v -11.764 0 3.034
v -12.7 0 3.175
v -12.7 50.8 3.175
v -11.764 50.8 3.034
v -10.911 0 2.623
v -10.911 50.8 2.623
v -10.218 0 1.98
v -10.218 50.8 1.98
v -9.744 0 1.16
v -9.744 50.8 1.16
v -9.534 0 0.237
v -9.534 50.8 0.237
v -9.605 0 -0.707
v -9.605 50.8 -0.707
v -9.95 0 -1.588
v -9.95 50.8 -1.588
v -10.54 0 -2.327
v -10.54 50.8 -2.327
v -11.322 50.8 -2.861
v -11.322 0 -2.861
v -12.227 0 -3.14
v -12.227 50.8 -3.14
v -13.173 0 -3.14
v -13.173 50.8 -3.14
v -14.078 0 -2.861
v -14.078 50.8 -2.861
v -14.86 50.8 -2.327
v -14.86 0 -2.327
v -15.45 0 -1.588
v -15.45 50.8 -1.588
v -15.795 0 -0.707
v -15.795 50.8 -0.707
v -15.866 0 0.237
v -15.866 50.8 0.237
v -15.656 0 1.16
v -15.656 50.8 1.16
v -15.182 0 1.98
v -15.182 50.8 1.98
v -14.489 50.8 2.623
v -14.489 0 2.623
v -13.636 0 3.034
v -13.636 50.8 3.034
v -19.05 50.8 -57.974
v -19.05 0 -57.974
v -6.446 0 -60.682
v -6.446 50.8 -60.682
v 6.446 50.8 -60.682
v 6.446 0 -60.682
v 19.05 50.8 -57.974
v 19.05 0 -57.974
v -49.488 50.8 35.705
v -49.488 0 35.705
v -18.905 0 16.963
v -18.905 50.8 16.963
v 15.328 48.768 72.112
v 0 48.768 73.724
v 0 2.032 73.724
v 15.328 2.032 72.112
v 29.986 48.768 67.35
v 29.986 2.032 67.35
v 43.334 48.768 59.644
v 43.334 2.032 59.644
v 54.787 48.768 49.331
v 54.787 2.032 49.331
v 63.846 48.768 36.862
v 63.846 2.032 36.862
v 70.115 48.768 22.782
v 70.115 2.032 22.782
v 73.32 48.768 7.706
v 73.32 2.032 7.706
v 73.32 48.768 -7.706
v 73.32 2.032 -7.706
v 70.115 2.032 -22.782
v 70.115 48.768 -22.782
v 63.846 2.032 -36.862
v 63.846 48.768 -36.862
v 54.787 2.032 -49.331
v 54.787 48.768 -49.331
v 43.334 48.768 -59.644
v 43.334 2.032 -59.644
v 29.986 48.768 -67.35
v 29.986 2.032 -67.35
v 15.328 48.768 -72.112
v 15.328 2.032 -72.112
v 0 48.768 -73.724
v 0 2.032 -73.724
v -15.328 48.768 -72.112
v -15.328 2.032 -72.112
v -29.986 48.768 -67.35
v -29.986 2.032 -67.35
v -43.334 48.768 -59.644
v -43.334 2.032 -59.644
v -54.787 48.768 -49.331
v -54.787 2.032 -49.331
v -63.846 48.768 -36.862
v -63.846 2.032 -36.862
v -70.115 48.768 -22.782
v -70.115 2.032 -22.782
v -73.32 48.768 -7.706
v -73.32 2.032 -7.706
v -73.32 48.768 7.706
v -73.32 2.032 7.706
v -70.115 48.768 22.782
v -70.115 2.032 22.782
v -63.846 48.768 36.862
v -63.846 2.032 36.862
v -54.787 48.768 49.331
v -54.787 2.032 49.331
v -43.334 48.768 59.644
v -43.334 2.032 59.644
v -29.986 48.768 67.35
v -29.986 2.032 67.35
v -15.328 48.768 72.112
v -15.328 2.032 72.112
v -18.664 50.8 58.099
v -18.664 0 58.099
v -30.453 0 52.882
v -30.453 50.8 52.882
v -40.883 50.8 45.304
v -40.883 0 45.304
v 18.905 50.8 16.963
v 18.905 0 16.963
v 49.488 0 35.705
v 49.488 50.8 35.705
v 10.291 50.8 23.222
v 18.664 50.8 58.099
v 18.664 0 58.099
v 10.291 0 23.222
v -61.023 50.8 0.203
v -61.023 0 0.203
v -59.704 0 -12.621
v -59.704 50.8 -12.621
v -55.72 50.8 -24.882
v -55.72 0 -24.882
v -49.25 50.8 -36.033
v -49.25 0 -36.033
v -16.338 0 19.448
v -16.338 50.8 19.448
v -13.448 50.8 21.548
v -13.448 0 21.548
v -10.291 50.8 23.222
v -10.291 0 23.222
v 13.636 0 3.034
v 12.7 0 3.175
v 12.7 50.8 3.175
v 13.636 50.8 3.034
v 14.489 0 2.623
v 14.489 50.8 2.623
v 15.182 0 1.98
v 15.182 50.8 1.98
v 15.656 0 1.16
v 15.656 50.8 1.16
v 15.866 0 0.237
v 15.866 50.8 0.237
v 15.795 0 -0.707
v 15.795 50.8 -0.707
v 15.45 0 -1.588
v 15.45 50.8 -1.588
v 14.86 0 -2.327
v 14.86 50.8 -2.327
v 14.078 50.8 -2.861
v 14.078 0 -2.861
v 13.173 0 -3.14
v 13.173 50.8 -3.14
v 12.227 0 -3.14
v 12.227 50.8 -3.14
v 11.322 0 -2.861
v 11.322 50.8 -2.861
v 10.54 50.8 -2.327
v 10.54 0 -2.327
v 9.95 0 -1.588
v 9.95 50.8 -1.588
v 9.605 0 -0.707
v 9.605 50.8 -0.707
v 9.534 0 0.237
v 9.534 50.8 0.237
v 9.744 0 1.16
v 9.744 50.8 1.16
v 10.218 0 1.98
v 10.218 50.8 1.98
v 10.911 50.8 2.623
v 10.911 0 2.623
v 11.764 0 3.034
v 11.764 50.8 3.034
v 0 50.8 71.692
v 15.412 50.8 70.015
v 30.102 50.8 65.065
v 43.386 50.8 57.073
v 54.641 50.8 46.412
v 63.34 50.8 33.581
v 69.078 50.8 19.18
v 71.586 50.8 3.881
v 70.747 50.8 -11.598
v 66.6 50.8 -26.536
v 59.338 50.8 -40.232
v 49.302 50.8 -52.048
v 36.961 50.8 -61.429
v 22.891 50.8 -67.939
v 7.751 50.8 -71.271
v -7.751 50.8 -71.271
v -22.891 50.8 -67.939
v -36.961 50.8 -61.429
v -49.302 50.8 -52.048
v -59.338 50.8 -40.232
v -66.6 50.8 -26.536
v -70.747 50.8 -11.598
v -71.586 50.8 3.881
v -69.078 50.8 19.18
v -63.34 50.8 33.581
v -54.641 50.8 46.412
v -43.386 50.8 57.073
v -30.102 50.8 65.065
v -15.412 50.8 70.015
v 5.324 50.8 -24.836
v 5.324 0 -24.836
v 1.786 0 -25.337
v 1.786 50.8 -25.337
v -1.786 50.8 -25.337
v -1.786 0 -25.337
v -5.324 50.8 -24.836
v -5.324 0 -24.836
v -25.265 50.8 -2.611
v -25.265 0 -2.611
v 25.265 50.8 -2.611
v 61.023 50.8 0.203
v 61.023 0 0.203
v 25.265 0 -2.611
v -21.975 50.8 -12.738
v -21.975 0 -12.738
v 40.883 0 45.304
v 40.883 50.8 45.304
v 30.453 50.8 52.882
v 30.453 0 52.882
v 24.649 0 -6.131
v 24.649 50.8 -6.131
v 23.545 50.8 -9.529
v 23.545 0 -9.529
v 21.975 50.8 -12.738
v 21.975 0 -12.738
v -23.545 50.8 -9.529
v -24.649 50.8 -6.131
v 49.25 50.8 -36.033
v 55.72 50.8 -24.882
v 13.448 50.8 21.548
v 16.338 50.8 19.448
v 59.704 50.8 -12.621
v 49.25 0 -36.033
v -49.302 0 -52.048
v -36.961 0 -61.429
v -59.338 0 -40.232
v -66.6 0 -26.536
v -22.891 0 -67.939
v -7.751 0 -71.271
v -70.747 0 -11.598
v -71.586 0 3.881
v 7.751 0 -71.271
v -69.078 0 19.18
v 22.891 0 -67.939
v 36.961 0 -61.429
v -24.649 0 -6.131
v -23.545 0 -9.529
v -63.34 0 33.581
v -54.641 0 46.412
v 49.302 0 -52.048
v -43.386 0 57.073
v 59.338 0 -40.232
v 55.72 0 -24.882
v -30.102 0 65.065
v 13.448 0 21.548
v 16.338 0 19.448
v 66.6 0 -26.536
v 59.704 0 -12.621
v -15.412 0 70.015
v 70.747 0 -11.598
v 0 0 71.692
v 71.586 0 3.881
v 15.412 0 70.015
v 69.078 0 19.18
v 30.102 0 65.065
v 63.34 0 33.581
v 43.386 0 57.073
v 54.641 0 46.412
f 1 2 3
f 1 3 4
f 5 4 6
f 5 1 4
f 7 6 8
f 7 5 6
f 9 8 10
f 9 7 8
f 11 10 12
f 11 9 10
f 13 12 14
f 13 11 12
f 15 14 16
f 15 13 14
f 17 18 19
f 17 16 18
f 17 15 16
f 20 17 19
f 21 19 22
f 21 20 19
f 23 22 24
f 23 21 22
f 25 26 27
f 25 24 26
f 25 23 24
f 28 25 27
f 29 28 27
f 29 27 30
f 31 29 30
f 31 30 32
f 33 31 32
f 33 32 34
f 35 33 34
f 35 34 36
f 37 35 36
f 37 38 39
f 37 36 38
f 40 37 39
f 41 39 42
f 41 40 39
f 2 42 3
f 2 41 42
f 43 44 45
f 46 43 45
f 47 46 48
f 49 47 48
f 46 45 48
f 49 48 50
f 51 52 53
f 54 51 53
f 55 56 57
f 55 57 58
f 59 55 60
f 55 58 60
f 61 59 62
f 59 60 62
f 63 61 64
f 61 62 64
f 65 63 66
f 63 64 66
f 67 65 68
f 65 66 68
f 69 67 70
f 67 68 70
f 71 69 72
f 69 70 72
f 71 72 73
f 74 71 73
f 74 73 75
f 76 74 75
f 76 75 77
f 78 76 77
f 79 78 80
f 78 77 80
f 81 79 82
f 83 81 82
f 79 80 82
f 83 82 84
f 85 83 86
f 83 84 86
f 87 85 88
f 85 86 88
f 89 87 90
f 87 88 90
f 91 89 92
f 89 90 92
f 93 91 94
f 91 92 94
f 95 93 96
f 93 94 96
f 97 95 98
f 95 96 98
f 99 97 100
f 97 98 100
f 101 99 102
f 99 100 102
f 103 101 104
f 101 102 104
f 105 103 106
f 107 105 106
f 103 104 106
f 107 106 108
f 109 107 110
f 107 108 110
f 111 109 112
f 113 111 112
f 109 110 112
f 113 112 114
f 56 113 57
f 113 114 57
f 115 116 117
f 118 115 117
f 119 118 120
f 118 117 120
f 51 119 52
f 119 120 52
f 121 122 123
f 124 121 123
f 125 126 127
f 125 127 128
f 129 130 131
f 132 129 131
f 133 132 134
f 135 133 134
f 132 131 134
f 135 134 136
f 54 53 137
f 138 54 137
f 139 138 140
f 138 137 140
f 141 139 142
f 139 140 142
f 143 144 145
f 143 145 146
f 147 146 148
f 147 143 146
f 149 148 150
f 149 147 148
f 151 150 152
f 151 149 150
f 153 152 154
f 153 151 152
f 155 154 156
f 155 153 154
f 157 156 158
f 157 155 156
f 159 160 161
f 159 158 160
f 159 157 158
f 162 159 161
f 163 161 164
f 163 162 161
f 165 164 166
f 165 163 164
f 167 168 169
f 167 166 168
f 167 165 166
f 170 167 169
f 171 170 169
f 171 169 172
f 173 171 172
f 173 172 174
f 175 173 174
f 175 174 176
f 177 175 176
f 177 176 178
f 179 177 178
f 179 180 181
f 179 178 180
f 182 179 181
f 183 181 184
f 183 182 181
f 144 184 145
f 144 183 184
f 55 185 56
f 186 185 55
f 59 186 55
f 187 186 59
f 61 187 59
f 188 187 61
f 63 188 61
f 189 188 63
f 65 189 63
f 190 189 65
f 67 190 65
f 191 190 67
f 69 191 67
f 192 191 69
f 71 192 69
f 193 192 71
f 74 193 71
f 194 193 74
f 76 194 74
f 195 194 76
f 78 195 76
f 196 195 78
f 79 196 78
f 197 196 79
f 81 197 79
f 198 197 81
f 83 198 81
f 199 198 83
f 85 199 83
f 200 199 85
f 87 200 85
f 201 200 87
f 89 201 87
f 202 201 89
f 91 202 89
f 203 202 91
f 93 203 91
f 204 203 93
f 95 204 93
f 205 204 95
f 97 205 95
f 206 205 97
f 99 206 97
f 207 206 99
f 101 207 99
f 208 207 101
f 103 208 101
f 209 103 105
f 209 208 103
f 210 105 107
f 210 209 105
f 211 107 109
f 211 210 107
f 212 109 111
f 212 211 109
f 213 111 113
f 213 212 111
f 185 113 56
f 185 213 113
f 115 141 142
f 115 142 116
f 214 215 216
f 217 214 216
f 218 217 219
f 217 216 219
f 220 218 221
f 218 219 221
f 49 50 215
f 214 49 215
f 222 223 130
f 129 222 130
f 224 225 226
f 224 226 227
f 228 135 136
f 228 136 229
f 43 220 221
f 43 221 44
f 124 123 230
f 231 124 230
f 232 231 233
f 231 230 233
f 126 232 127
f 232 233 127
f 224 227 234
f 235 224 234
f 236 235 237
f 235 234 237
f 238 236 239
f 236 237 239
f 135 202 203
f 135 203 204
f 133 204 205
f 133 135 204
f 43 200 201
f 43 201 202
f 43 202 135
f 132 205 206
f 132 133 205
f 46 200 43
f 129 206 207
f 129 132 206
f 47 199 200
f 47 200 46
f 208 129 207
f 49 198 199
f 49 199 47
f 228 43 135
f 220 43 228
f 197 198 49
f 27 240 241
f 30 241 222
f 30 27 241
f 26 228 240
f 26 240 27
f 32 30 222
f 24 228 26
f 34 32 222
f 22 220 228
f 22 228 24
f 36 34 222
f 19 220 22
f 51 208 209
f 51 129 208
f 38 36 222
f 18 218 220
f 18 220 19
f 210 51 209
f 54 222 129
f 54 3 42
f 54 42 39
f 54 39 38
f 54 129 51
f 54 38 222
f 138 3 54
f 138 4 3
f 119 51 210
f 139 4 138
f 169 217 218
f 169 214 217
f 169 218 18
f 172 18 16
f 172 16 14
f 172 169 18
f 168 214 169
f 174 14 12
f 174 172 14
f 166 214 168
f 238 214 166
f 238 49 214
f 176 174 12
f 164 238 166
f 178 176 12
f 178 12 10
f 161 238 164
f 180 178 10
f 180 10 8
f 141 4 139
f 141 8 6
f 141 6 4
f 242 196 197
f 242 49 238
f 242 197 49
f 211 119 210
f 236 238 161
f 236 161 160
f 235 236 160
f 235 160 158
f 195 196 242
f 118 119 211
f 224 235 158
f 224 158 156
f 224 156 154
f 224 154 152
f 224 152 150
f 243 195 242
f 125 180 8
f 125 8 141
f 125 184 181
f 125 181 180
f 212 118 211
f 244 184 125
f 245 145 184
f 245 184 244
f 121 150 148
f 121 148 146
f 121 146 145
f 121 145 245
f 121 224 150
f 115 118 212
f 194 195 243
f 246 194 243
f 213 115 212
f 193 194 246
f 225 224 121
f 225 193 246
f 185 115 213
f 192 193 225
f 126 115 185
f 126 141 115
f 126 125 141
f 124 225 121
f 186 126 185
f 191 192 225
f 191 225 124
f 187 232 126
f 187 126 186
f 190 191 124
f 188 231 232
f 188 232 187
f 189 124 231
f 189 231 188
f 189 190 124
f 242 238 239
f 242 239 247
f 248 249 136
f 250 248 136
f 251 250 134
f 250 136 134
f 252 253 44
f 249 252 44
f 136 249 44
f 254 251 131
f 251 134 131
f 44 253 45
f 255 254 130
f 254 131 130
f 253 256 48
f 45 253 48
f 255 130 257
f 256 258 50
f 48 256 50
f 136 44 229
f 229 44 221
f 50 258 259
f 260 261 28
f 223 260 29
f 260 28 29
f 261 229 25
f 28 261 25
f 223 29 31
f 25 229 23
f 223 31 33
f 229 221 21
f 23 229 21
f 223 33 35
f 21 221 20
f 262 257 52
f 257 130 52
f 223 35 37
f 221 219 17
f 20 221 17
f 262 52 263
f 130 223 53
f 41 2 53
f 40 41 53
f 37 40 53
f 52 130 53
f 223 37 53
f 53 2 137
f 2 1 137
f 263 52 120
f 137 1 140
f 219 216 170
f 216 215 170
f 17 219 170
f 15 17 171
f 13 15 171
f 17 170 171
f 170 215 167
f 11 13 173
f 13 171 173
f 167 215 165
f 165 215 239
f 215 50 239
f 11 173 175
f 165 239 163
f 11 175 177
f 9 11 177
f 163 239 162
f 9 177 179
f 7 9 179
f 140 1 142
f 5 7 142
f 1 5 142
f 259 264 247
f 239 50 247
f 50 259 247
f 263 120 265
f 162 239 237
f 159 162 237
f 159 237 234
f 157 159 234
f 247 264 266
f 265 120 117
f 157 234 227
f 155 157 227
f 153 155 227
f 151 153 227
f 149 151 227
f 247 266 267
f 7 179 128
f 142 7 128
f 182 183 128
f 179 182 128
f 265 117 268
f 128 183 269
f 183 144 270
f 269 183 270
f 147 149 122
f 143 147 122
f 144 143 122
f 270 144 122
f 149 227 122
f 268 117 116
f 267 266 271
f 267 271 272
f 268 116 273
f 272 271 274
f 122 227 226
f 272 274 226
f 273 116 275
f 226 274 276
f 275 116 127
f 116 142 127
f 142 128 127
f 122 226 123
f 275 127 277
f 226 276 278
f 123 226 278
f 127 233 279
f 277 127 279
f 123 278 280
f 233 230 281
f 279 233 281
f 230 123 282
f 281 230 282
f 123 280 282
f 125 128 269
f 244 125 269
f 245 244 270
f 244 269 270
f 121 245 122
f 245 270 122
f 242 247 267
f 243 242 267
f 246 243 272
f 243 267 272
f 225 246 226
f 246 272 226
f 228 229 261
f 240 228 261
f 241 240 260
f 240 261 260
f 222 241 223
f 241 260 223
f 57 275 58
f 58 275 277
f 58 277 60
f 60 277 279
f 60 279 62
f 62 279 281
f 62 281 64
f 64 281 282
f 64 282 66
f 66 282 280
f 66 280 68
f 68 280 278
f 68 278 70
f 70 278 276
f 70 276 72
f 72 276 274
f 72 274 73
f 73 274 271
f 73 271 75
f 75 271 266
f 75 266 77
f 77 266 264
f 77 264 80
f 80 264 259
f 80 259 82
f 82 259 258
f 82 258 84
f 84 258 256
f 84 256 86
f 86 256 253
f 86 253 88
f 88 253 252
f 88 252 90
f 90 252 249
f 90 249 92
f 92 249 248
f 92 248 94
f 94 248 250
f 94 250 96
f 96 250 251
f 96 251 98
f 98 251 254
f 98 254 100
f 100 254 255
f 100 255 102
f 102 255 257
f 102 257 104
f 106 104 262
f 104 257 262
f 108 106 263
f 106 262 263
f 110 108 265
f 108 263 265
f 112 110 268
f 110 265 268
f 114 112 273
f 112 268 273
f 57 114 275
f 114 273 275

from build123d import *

# Parameters (mm, degrees)
SKETCH2_R               = 73.7235
BOSS_EXTRUDE1_DEPTH     = 50.8
CHAMFER1_SIZE           = 2.032
CUT_EXTRUDE1_DEPTH      = 116.978225993
CUT_EXTRUDE1_DEPTH_BACK = 116.978225993
SKETCH3_R               = 3.175
CUT_EXTRUDE2_DEPTH      = 116.978225993
CUT_EXTRUDE2_DEPTH_BACK = 116.978225993


with BuildPart() as part:
    # Sketch2 → Boss-Extrude1 (new body)
    with BuildSketch(Plane(origin=(0, 0, 0), x_dir=(1, 0, 0), z_dir=(0, 1, 0))):
        with Locations(Location((0, 0, 0), (0, 0, 270))):
            Circle(SKETCH2_R)
    extrude(amount=BOSS_EXTRUDE1_DEPTH)

    # Chamfer1
    chamfer1_edges = [part.edges().sort_by_distance(p)[0] for p in [
        (0, 0, -73.7235),
        (0, 50.8, -73.7235),
    ]]
    chamfer(chamfer1_edges, length=CHAMFER1_SIZE)

    # Sketch3 → Cut-Extrude1 (cut, two sides: drawn at the far end of the back side and taken through both)
    with BuildSketch(Plane(origin=(0, 50.8, 0), x_dir=(1, 0, 0), z_dir=(0, 1, 0)).offset(-CUT_EXTRUDE1_DEPTH_BACK)):
        with Locations(Location((-12.7, 0, 0), (0, 0, 270))):
            Circle(SKETCH3_R)
        with Locations(Location((12.7, 0, 0), (0, 0, 270))):
            Circle(SKETCH3_R)
    extrude(amount=CUT_EXTRUDE1_DEPTH + CUT_EXTRUDE1_DEPTH_BACK, mode=Mode.SUBTRACT)

    # Sketch4 → Cut-Extrude2 (cut, two sides: drawn at the far end of the back side and taken through both)
    with BuildSketch(Plane(origin=(0, 50.8, 0), x_dir=(1, 0, 0), z_dir=(0, 1, 0)).offset(-CUT_EXTRUDE2_DEPTH_BACK)):
        with BuildLine():
            Line((-5.323781477, 24.835807834), (-19.05, 57.973830754))
            ThreePointArc((-19.05, 57.973830754), (0, 61.0235), (19.05, 57.973830754))
            Line((19.05, 57.973830754), (5.323781477, 24.835807834))
            ThreePointArc((5.323781477, 24.835807834), (0, 25.4), (-5.323781477, 24.835807834))
        make_face()
        with BuildLine():
            Line((21.975117928, 12.737903755), (49.24961577, 36.032525567))
            ThreePointArc((49.24961577, 36.032525567), (58.036797322, 18.857298556), (61.023163256, -0.202727704))
            Line((61.023163256, -0.202727704), (25.265395829, 2.611469625))
            ThreePointArc((25.265395829, 2.611469625), (24.156835514, 7.849031657), (21.975117928, 12.737903755))
        make_face()
        with BuildLine():
            Line((18.905151263, -16.963350369), (49.487936479, -35.704505253))
            ThreePointArc((49.487936479, -35.704505253), (35.868713343, -49.369048556), (18.664388993, -58.099123365))
            Line((18.664388993, -58.099123365), (10.291091885, -23.221830845))
            ThreePointArc((10.291091885, -23.221830845), (14.929745408, -20.549031657), (18.905151263, -16.963350369))
        make_face()
        with BuildLine():
            Line((-10.291091885, -23.221830845), (-18.664388993, -58.099123365))
            ThreePointArc((-18.664388993, -58.099123365), (-35.868713343, -49.369048556), (-49.487936479, -35.704505253))
            Line((-49.487936479, -35.704505253), (-18.905151263, -16.963350369))
            ThreePointArc((-18.905151263, -16.963350369), (-14.929745408, -20.549031657), (-10.291091885, -23.221830845))
        make_face()
        with BuildLine():
            Line((-25.265395829, 2.611469625), (-61.023163256, -0.202727704))
            ThreePointArc((-61.023163256, -0.202727704), (-58.036797322, 18.857298556), (-49.24961577, 36.032525567))
            Line((-49.24961577, 36.032525567), (-21.975117928, 12.737903755))
            ThreePointArc((-21.975117928, 12.737903755), (-24.156835514, 7.849031657), (-25.265395829, 2.611469625))
        make_face()
    extrude(amount=CUT_EXTRUDE2_DEPTH + CUT_EXTRUDE2_DEPTH_BACK, mode=Mode.SUBTRACT)


solid = part.part
